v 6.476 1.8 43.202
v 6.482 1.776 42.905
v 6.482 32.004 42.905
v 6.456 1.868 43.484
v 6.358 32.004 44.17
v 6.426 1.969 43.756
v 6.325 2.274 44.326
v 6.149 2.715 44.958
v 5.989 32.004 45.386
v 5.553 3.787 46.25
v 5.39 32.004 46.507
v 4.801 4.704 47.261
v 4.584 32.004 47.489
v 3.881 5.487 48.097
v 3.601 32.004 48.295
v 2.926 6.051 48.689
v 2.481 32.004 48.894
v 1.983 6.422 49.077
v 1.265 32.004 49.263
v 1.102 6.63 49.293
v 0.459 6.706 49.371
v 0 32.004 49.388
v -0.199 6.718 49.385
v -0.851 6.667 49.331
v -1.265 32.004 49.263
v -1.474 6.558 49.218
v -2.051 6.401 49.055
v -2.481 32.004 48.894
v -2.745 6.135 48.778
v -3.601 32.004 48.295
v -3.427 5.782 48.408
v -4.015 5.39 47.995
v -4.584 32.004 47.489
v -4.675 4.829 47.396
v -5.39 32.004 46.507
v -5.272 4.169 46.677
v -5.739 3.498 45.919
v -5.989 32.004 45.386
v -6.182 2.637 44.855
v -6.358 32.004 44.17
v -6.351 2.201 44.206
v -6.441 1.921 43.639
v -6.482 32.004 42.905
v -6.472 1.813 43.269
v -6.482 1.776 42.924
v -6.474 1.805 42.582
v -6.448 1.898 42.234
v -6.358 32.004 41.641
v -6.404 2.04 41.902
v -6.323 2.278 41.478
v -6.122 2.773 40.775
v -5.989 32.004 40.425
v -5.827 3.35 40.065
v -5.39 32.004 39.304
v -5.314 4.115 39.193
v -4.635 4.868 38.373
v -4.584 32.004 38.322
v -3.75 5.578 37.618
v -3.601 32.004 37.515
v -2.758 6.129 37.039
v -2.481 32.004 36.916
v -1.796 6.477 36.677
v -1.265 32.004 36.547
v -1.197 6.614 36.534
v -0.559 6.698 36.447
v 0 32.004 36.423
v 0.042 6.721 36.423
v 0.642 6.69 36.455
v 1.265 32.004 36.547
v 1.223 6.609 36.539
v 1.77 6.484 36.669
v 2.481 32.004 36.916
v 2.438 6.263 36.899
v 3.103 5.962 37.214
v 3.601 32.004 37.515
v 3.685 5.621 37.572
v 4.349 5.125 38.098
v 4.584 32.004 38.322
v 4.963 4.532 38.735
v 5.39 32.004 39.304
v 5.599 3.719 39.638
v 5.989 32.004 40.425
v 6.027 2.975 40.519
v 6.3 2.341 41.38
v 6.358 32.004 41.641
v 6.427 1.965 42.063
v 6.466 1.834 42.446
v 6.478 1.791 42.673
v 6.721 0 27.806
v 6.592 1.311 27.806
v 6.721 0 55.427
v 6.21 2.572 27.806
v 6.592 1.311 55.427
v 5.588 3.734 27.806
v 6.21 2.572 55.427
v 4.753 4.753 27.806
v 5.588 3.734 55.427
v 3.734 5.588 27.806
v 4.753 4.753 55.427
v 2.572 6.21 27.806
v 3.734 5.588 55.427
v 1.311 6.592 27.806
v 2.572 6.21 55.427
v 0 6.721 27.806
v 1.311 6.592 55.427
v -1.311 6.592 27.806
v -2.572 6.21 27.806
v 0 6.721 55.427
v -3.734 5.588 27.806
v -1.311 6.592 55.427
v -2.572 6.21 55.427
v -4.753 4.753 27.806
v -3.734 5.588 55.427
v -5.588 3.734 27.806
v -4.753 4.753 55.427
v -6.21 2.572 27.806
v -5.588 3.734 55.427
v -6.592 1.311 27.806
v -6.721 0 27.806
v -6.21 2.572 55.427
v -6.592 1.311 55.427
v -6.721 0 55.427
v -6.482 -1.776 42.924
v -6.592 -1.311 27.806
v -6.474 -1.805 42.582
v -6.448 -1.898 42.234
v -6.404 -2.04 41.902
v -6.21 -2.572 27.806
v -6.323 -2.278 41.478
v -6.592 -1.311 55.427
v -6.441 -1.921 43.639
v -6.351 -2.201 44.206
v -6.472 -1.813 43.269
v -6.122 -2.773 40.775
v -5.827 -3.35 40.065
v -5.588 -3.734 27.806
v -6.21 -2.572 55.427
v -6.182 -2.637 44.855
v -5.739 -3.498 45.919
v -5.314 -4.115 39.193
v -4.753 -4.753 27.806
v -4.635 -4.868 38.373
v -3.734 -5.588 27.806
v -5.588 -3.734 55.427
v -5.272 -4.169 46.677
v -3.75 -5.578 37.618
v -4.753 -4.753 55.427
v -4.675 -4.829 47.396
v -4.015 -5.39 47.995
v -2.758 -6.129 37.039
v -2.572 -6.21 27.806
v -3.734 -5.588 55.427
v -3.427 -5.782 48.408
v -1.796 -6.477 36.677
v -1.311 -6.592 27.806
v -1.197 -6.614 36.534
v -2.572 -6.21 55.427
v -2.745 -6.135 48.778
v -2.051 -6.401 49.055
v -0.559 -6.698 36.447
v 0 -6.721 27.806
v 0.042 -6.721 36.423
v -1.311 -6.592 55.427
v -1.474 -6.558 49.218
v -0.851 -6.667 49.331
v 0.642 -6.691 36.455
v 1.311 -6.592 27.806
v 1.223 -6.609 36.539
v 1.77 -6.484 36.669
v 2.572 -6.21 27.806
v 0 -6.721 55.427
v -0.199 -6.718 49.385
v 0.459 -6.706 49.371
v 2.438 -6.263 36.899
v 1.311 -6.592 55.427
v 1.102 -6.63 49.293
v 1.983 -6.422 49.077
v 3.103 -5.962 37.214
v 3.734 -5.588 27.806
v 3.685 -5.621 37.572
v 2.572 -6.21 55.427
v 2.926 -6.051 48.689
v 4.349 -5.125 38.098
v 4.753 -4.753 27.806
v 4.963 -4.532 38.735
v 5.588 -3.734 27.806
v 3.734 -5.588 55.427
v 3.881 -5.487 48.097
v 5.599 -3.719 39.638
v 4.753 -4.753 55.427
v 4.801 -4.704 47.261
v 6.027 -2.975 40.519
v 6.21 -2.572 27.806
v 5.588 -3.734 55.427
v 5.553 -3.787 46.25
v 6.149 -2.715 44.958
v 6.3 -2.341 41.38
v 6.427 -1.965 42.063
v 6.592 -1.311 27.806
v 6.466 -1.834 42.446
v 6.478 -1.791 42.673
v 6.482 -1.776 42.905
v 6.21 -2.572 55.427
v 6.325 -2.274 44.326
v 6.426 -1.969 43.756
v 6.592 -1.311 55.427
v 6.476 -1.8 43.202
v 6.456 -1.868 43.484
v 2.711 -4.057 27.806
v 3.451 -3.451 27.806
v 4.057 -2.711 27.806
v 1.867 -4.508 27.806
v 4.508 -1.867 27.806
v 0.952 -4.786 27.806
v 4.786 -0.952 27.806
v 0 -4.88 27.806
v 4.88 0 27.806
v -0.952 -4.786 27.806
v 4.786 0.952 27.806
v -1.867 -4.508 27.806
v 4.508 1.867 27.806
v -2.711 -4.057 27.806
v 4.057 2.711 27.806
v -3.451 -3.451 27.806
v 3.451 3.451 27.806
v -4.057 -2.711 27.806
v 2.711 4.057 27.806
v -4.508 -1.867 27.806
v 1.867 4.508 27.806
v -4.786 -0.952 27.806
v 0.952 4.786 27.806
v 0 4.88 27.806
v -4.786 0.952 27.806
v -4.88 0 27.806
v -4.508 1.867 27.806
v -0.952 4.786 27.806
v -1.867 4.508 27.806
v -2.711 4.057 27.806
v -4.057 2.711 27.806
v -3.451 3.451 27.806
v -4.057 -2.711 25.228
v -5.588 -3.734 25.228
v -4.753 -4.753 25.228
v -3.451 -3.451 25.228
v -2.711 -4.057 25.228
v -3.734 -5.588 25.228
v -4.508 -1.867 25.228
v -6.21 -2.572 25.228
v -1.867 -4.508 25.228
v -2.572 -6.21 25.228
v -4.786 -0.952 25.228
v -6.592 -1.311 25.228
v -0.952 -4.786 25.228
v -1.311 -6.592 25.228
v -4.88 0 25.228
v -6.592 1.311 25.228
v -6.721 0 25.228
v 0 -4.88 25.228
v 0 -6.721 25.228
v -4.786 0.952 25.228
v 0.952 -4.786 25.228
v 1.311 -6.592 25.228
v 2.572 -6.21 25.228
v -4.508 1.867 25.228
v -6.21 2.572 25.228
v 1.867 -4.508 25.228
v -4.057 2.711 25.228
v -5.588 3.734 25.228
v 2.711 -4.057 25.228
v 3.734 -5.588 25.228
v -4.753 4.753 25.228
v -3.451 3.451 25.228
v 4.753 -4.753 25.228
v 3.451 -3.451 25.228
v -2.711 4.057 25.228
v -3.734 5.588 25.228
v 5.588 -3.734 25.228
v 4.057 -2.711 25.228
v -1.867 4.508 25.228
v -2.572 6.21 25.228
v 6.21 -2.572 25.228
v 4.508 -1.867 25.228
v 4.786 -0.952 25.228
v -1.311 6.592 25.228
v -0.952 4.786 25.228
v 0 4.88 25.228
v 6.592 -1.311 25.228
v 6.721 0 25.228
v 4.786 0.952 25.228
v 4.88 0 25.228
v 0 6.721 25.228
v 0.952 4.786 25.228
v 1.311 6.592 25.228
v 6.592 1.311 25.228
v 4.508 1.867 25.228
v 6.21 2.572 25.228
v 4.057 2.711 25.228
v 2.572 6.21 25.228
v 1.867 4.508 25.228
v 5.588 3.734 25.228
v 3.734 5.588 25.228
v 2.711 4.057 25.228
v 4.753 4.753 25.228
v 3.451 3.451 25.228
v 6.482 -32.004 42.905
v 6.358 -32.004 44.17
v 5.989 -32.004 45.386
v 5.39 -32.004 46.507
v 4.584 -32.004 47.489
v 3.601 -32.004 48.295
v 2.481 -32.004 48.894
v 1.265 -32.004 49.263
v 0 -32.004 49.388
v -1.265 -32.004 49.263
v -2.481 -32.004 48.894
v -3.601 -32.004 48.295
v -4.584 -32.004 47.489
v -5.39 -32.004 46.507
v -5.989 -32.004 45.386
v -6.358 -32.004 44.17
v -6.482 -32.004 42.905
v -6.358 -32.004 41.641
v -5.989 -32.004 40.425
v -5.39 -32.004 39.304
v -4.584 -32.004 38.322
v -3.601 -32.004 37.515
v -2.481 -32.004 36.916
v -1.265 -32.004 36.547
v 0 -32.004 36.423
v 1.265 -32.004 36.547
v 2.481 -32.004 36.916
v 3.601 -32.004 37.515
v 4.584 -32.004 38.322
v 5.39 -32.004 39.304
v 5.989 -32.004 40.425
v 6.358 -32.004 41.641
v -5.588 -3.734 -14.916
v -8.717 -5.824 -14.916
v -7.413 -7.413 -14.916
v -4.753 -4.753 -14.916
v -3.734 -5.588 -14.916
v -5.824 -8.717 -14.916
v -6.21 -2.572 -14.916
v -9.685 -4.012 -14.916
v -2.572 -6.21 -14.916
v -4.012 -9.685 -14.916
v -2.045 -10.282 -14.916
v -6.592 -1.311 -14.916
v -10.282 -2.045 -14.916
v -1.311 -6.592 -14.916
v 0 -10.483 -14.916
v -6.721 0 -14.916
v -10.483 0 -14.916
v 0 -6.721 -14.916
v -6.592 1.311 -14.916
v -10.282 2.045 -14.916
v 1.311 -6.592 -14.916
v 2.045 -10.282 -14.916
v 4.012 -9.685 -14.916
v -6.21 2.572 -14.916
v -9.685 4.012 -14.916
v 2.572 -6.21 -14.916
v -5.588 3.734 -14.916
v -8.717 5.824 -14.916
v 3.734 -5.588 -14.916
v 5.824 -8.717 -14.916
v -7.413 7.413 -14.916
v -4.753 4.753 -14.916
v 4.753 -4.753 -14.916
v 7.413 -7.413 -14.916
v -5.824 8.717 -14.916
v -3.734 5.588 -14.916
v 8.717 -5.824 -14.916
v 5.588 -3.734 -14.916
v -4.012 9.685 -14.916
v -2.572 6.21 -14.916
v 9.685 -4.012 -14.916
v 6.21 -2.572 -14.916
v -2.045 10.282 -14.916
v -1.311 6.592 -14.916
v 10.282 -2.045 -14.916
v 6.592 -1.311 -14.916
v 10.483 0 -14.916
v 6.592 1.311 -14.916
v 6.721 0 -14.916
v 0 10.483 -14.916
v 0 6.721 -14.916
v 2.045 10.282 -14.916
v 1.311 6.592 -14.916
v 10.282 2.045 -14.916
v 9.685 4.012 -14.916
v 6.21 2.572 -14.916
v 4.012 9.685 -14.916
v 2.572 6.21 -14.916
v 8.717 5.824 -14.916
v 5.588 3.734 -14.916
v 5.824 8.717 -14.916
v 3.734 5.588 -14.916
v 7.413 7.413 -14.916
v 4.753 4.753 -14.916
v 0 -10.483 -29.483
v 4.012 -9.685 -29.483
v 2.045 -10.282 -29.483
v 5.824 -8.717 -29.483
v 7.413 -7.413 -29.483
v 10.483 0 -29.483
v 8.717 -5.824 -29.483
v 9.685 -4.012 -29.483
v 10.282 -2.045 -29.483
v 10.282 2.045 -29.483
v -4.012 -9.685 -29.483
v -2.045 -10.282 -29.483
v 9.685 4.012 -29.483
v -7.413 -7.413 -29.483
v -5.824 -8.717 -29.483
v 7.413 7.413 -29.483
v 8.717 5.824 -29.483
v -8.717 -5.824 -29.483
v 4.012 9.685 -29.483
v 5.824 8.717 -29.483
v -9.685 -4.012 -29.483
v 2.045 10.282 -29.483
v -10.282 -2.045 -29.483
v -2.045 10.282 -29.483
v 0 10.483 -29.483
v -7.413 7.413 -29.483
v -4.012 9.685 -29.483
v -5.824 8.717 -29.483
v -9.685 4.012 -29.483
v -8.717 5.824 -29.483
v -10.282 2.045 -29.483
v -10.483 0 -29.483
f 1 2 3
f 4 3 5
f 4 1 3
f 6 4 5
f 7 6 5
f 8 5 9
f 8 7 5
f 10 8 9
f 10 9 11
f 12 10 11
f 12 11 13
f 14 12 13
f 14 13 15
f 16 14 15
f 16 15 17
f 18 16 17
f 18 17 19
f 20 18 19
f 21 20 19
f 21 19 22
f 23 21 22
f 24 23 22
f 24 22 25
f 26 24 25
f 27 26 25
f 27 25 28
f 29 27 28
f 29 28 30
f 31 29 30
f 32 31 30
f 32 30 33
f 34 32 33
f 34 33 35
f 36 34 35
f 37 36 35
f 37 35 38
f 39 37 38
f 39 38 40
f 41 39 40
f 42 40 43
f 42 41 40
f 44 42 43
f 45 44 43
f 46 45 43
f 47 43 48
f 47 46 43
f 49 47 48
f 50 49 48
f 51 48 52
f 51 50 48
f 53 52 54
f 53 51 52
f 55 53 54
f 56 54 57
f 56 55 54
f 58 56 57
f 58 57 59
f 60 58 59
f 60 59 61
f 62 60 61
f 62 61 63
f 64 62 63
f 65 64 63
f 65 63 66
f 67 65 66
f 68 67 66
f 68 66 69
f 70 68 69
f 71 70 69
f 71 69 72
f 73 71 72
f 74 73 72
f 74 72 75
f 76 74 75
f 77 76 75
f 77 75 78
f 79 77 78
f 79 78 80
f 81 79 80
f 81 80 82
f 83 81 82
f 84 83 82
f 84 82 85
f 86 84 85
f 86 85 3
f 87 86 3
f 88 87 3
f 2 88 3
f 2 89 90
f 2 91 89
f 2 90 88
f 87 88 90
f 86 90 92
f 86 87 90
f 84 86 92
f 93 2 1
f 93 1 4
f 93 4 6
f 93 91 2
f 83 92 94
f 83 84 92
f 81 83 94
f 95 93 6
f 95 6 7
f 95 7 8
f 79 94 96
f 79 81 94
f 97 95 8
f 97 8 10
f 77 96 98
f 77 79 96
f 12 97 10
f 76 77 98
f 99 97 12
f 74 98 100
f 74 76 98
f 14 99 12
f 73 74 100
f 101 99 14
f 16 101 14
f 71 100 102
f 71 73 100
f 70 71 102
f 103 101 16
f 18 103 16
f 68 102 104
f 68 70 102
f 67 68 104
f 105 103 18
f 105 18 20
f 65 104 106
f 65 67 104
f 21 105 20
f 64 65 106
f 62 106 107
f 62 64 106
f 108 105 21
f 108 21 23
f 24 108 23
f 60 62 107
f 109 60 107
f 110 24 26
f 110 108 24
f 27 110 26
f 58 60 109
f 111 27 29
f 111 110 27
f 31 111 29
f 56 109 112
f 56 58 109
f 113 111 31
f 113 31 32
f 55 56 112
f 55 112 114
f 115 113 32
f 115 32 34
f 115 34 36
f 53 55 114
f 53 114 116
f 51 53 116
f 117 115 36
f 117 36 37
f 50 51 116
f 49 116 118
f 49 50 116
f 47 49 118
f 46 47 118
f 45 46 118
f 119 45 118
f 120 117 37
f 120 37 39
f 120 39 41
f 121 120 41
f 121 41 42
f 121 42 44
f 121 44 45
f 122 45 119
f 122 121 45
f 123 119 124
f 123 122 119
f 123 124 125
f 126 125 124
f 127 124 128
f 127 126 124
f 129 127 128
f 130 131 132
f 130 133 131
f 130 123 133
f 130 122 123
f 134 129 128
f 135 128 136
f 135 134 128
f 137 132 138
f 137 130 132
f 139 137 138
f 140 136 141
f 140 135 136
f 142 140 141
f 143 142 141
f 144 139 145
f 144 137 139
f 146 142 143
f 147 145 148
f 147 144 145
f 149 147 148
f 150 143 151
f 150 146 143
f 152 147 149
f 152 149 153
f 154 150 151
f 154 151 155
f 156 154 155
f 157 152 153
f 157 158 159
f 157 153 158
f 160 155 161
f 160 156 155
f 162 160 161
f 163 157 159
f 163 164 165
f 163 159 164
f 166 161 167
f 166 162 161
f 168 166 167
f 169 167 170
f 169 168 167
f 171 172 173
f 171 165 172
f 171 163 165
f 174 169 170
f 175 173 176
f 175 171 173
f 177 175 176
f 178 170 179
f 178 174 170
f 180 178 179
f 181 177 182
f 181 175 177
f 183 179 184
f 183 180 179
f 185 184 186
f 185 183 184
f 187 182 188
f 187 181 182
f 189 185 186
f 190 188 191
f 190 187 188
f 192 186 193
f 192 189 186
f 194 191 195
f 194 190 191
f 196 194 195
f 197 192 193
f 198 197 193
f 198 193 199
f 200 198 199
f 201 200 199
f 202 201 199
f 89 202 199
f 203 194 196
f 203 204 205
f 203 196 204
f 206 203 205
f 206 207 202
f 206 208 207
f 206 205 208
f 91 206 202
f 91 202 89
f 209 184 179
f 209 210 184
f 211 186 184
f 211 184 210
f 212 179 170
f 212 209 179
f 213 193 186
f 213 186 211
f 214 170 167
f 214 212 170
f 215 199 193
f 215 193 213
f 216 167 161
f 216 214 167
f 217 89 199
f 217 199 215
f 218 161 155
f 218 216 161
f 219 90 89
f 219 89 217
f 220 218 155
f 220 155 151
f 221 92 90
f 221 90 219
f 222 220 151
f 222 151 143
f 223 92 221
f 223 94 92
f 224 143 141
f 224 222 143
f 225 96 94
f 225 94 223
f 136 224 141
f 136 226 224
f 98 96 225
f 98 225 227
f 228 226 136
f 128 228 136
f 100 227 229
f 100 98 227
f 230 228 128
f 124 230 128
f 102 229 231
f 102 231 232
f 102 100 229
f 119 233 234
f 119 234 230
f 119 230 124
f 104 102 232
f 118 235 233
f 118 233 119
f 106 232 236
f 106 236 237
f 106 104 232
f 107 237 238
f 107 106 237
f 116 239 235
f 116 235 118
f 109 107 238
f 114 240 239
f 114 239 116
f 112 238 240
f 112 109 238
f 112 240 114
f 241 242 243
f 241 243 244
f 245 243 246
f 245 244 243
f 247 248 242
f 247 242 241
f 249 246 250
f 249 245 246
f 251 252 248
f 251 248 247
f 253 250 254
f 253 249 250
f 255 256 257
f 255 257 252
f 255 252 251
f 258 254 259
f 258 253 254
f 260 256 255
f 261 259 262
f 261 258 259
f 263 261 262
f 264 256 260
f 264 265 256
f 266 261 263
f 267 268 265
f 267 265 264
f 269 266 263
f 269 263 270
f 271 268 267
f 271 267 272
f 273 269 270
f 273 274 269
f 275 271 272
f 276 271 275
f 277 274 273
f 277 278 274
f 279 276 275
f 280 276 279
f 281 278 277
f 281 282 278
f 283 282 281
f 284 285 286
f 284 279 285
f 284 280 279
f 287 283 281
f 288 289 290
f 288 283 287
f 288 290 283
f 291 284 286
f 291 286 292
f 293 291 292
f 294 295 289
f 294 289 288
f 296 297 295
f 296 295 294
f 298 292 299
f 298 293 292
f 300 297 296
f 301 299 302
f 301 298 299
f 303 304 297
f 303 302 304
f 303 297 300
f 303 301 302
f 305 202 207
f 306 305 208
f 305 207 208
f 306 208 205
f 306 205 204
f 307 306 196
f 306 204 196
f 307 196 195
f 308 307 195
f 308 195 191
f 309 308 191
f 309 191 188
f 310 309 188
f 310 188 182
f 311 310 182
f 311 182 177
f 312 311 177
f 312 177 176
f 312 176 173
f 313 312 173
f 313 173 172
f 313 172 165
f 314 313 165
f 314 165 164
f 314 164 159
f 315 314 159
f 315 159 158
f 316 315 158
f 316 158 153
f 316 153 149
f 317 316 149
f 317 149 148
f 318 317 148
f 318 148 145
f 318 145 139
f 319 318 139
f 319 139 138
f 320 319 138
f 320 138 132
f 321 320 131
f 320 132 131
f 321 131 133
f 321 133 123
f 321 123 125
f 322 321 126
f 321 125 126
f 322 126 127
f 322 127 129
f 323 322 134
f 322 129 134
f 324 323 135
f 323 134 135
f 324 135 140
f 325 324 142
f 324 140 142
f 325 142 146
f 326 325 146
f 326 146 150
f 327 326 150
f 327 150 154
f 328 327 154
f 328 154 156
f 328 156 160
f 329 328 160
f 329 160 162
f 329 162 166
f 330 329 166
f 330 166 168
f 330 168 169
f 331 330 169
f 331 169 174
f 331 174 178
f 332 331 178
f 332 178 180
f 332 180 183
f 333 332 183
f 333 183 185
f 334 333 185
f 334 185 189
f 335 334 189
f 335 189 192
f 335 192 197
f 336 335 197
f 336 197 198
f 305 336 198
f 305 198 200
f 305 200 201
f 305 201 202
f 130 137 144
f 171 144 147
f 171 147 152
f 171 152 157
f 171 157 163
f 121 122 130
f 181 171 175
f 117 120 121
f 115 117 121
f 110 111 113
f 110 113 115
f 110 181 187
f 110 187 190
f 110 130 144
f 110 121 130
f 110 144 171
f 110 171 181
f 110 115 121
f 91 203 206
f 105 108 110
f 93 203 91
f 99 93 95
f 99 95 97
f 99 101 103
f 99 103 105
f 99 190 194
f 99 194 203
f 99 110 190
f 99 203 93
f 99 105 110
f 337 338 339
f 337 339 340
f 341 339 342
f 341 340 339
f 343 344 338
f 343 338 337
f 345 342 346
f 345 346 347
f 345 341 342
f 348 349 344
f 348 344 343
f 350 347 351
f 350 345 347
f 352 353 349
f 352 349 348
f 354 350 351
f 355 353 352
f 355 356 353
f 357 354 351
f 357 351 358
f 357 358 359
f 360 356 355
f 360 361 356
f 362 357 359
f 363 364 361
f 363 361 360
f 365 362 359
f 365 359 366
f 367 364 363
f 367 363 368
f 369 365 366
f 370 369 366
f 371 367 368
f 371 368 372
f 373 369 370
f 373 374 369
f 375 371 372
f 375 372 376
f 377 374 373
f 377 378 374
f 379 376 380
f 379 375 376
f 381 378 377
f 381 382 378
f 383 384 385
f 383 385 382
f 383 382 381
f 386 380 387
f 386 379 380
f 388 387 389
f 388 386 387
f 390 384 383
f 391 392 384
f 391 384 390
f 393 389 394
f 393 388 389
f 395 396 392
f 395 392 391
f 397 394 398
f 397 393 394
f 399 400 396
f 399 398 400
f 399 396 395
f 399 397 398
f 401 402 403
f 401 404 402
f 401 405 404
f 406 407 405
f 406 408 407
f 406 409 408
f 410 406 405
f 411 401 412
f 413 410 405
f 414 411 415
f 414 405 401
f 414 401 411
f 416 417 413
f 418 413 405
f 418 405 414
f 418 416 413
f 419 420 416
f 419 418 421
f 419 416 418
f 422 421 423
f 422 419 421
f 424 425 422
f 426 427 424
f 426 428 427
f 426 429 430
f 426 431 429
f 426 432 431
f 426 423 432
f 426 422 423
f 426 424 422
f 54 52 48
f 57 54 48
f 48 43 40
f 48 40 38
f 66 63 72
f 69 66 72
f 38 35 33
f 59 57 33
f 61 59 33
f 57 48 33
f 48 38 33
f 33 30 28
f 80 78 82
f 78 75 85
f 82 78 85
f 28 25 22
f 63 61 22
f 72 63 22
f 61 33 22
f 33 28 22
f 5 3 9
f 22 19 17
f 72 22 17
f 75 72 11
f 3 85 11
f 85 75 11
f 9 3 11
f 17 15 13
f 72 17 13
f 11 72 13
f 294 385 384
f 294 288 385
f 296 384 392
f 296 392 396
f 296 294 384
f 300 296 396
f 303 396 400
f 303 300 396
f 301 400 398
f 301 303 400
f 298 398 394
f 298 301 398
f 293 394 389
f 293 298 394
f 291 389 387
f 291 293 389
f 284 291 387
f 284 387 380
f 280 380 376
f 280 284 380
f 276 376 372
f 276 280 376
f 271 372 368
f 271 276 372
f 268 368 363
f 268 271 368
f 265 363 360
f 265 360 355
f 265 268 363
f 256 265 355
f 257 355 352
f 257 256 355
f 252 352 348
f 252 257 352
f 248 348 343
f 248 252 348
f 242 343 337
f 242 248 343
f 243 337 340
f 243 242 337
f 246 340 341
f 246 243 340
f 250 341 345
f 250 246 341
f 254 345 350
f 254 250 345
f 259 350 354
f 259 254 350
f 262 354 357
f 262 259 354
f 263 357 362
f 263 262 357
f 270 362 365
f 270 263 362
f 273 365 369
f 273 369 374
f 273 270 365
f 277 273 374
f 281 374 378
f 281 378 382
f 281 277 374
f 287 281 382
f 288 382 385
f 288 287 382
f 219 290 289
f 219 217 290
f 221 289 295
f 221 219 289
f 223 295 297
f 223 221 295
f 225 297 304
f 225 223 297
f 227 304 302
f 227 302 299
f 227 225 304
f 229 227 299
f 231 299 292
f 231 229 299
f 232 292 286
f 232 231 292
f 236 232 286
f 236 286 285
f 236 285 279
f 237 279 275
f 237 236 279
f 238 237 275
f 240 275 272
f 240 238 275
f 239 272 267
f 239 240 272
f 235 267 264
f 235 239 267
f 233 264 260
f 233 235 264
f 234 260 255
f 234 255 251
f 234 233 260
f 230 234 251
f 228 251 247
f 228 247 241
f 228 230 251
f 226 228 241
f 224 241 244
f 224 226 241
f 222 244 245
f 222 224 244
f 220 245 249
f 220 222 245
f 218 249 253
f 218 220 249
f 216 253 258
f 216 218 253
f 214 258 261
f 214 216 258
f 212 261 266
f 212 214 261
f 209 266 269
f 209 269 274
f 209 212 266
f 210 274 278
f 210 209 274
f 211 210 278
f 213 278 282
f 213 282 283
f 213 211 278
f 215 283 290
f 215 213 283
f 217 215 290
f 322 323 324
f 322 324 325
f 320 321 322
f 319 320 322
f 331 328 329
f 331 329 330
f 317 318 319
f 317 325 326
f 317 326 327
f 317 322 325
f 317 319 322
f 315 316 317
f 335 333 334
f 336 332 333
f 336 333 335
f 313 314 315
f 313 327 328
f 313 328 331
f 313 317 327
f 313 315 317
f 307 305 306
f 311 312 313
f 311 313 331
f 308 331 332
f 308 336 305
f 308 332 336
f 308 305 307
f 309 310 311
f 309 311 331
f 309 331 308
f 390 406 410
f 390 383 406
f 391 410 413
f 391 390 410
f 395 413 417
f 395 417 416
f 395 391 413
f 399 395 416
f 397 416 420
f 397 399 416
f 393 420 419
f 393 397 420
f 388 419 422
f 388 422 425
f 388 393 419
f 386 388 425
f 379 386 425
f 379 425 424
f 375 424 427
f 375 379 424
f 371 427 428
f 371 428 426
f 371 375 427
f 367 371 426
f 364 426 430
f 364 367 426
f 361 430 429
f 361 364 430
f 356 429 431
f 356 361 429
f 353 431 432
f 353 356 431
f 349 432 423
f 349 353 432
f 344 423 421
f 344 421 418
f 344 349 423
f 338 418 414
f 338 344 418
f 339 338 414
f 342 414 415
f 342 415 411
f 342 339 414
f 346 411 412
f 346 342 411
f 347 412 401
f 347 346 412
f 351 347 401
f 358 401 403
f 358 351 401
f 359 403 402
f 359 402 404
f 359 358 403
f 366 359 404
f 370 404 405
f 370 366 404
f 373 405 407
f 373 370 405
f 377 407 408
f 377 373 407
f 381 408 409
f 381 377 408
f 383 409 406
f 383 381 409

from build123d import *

# Parameters (mm, degrees)
F2_R          = 6.482371
F3_DEPTH      = 32.004
F3_DEPTH_BACK = 32.004


with BuildPart() as f1:
    # F0 (on Front) → F1 (revolve)
    with BuildSketch(Plane.XZ):
        Polygon((6.721209, 55.426951), (0, 55.426951), (0, 27.805546), (0, 25.227549), (0, 0), (0, -21.728838), (0, -29.483447), (10.483314, -29.483447), (10.483314, -14.915559), (6.721209, -14.915559), (6.721209, 25.227549), (4.879782, 25.227549), (4.879782, 27.805546), (6.721209, 27.805546), (6.721209, 42.352822), (6.721209, 48.06124), align=None)
    revolve(axis=Axis((0, 0, 27.713476), (0, 0, 1)))

    # F2 (on Front) → F3 (join, two sides)
    with BuildSketch(Plane.XZ) as f3_sk:
        with Locations((0, 42.905249)):
            Circle(F2_R)
    extrude(amount=F3_DEPTH)
    extrude(f3_sk.sketch, amount=-F3_DEPTH_BACK)


solid = f1.part
